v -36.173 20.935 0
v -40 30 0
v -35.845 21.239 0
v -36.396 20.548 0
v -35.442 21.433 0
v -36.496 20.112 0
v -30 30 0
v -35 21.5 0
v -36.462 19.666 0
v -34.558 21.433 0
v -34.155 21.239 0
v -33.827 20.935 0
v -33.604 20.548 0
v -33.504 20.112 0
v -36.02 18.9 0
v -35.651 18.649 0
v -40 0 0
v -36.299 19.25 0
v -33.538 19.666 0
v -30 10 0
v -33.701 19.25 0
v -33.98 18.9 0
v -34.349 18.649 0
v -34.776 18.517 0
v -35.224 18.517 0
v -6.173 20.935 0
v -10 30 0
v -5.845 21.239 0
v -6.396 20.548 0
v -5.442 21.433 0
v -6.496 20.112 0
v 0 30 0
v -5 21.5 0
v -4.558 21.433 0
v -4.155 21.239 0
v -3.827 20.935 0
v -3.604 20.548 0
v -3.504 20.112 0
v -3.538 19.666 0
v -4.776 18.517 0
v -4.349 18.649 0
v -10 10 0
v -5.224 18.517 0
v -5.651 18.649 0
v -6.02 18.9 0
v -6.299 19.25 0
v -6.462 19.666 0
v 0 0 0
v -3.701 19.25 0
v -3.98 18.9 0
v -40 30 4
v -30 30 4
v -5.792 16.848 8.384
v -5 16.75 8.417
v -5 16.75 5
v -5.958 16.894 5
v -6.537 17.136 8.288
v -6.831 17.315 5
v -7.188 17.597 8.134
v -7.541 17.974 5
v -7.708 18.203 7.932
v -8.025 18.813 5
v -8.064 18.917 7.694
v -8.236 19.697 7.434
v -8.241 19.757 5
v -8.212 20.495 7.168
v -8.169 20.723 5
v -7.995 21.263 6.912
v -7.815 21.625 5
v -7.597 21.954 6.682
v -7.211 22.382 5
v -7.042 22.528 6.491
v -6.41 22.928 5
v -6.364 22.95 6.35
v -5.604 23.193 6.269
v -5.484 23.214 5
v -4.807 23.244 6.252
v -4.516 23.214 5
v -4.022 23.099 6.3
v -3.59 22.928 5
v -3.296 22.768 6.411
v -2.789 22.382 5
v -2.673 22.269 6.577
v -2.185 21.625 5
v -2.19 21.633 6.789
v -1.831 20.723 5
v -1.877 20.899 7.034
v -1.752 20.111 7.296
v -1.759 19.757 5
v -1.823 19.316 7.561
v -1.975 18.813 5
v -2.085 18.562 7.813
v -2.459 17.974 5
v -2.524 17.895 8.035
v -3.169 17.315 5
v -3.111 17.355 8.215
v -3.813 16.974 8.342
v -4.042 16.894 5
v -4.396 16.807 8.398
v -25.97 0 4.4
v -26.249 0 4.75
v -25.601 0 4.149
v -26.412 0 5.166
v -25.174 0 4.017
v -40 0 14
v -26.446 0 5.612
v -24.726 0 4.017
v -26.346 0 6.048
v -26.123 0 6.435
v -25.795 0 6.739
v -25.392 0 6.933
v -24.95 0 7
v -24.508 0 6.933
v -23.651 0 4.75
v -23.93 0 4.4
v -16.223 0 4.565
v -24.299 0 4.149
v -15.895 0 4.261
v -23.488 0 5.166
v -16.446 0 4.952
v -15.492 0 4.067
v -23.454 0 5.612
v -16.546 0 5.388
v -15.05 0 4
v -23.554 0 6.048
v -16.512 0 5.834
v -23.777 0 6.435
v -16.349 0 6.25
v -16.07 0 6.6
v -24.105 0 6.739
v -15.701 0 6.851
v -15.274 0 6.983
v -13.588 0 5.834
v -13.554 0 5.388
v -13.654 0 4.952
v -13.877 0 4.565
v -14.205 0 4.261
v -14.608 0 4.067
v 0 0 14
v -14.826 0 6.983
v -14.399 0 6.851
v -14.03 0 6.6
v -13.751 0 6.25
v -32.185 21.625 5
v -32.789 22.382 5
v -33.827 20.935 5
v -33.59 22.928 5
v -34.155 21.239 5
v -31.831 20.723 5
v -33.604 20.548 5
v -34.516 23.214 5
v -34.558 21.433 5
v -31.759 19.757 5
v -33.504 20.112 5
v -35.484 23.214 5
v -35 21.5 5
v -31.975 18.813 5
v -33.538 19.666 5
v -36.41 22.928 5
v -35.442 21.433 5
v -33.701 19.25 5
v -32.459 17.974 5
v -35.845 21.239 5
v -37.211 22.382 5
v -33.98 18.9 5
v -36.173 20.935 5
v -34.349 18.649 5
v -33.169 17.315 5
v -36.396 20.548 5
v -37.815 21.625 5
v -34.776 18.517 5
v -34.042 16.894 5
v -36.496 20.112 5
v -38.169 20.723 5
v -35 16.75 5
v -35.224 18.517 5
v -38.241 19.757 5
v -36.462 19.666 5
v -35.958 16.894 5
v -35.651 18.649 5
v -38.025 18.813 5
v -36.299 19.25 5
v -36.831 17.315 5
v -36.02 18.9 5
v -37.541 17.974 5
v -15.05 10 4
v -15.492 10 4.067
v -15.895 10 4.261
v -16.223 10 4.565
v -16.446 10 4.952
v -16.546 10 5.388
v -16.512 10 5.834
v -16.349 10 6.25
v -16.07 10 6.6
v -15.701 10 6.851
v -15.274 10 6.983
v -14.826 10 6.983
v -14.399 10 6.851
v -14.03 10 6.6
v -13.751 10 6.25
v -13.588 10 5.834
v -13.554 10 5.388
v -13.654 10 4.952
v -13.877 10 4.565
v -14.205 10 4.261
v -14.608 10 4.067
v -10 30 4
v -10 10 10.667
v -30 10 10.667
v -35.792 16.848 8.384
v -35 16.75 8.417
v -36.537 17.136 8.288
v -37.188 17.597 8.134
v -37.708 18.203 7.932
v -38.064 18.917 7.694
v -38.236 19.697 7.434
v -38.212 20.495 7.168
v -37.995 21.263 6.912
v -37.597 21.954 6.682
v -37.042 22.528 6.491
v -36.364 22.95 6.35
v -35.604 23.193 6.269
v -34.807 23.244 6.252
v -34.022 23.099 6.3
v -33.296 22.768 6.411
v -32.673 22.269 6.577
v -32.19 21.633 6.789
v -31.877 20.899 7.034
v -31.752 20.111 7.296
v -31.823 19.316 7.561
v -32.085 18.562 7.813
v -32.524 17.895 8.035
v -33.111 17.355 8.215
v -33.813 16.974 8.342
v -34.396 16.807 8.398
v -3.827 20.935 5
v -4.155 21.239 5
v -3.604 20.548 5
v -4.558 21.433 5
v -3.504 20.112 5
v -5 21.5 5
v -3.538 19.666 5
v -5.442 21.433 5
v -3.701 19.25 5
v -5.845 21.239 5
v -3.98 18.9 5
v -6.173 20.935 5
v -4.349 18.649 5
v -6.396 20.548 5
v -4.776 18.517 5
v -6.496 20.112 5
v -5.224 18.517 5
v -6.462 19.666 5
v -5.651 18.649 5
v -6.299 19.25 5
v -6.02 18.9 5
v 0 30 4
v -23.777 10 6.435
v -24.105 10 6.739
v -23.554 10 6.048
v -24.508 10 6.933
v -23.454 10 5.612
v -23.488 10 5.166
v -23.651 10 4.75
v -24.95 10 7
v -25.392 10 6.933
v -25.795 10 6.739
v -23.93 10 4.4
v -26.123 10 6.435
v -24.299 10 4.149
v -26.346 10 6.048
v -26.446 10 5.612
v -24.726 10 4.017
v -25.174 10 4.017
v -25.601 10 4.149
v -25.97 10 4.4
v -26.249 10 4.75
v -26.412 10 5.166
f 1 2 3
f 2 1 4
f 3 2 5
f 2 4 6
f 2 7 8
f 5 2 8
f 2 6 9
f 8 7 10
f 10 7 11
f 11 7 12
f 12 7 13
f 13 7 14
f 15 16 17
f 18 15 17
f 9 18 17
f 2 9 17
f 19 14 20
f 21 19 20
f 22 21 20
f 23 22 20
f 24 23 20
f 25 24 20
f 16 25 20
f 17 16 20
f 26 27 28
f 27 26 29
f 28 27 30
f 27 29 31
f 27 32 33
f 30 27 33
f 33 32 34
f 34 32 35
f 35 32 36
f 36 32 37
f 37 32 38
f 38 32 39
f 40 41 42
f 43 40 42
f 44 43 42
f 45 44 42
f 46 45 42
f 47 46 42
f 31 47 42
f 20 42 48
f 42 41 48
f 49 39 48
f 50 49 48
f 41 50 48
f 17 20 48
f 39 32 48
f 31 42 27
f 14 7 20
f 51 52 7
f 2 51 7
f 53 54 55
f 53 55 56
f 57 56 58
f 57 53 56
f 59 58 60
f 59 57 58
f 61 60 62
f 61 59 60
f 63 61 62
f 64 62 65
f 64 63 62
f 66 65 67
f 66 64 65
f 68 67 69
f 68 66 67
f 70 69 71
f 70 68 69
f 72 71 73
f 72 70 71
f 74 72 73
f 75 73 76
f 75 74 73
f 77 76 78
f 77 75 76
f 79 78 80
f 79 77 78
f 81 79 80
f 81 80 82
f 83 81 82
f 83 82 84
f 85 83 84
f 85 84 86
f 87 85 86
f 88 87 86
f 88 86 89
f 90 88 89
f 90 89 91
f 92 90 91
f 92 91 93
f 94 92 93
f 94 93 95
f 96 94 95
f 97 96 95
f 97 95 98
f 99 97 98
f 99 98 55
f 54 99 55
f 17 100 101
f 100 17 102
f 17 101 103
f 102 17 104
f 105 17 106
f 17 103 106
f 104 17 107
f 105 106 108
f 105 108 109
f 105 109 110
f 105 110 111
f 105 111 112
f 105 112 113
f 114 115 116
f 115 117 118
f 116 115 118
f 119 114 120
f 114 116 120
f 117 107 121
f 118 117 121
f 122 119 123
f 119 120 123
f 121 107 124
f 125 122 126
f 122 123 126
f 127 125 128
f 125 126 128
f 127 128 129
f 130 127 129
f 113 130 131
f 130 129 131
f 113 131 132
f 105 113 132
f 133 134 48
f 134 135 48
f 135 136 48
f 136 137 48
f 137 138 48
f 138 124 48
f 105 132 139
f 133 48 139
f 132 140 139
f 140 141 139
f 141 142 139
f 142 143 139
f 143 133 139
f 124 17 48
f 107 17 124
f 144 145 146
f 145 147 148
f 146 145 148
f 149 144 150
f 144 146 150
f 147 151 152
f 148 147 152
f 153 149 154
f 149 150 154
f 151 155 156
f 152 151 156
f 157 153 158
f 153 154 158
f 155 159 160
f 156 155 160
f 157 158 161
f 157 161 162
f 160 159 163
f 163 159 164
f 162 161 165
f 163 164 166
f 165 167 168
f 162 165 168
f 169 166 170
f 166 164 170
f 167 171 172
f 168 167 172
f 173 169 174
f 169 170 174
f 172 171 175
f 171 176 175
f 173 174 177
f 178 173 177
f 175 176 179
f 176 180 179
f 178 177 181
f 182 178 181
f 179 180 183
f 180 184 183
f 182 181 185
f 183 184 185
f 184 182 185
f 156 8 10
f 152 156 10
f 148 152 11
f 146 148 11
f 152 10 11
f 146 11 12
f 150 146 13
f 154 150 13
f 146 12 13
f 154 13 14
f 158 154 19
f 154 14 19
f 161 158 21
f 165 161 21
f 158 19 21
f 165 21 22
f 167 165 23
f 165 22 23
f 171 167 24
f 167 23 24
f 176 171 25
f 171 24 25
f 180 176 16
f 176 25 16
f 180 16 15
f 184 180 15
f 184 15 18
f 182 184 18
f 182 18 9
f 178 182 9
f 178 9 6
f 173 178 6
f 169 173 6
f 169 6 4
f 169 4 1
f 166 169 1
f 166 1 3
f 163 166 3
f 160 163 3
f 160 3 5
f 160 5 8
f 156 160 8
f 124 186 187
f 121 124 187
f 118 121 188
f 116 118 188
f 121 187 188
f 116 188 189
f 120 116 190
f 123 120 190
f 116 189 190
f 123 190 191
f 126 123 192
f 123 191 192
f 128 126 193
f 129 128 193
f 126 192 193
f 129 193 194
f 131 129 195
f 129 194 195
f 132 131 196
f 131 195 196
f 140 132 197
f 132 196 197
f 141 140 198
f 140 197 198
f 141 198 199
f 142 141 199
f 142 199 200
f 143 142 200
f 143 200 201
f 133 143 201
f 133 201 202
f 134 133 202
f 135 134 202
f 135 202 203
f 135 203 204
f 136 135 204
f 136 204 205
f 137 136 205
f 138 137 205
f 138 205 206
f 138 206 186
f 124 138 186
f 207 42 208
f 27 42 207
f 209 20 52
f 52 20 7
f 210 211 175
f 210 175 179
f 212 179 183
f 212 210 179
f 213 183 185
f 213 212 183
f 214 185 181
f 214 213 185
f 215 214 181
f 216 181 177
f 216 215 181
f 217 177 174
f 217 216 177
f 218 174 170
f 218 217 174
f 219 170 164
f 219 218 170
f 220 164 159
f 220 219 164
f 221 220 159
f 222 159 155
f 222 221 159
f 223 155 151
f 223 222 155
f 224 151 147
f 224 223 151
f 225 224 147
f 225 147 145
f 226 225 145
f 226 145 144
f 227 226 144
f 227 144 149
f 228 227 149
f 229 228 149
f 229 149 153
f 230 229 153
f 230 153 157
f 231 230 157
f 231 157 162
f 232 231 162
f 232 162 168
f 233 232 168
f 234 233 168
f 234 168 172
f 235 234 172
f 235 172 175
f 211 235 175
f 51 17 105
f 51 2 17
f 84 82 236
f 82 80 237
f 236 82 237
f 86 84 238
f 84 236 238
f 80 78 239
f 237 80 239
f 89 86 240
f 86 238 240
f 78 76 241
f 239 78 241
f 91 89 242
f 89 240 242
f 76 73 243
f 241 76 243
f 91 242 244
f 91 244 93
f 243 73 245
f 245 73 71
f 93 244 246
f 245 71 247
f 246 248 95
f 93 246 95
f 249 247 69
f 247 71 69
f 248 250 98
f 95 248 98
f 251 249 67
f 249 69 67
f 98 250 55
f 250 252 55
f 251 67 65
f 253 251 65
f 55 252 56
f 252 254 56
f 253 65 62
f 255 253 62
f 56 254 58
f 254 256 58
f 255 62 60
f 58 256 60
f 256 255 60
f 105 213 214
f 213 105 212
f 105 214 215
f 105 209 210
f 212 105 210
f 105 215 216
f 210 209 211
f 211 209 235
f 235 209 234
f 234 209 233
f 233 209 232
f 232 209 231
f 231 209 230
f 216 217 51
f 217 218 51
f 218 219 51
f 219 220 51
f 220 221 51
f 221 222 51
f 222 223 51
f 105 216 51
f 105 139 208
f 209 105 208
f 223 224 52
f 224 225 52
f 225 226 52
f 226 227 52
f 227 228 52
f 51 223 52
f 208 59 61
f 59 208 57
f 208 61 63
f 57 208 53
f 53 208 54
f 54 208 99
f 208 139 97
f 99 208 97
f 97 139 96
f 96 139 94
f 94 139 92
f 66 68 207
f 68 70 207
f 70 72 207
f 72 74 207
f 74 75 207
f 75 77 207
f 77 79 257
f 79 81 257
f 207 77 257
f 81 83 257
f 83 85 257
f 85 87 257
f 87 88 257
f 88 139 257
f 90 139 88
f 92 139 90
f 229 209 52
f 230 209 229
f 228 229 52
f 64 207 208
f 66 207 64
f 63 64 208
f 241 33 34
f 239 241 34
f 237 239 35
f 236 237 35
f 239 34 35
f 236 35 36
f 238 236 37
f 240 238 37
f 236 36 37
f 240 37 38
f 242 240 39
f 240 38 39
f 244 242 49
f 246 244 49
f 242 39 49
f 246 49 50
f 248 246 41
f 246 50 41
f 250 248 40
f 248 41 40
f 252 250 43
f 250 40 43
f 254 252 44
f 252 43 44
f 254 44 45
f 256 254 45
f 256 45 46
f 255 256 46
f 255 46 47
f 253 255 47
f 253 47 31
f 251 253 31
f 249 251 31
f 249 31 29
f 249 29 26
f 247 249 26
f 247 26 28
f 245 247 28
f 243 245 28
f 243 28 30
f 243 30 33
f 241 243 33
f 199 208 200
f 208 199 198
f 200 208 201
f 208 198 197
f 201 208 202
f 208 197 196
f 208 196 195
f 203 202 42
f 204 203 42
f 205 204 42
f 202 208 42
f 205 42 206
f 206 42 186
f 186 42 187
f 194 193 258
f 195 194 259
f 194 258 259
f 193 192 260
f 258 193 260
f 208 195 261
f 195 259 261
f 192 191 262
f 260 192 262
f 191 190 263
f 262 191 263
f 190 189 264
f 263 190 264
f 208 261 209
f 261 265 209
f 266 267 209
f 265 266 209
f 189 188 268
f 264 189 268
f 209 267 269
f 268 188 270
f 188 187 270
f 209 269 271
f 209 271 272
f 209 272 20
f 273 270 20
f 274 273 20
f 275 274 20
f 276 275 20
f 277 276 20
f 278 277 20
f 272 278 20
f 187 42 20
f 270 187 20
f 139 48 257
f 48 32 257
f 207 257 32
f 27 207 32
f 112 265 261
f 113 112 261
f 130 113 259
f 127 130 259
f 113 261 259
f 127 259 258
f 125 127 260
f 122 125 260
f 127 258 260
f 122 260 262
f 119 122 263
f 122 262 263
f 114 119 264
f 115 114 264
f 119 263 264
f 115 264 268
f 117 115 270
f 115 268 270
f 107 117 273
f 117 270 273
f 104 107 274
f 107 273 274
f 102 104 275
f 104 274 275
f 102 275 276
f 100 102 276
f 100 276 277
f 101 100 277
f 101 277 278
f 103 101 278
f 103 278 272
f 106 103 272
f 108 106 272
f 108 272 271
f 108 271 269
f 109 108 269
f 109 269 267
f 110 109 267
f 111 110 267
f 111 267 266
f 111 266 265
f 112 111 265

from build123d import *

# Parameters (mm, degrees)
EXTRUDE1_DEPTH = 40
SKETCH2_W      = 20
SKETCH2_H      = 20
EXTRUDE2_DEPTH = 52.923019943
SKETCH3_R      = 1.5
EXTRUDE3_DEPTH = 52.923019943
SKETCH4_R      = 1.5
EXTRUDE4_DEPTH = 47.861498055
SKETCH8_R      = 3.25
EXTRUDE5_DEPTH = 9


with BuildPart() as part:
    # Sketch1 → Extrude1 (new body)
    with BuildSketch(Plane(origin=(0, 0, 0), x_dir=(0, 0, -1), z_dir=(1, 0, 0))):
        Polygon((0, 0), (-14, 0), (-4, 30), (0, 30), align=None)
    extrude(amount=-EXTRUDE1_DEPTH)

    # Sketch2 → Extrude2 (cut, through all)
    with BuildSketch(Plane(origin=(0, 0, 0), x_dir=(-1, 0, 0), z_dir=(0, 0, -1))):
        with Locations((20, 20)):
            Rectangle(SKETCH2_W, SKETCH2_H)
    extrude(amount=-EXTRUDE2_DEPTH, mode=Mode.SUBTRACT)

    # Sketch3 → Extrude3 (cut, through all)
    with BuildSketch(Plane(origin=(0, 0, 0), x_dir=(-1, 0, 0), z_dir=(0, 0, -1))):
        with Locations(Location((5, 20, 0), (0, 0, 90))):
            Circle(SKETCH3_R)
        with Locations(Location((35, 20, 0), (0, 0, 90))):
            Circle(SKETCH3_R)
    extrude(amount=-EXTRUDE3_DEPTH, mode=Mode.SUBTRACT)

    # Sketch4 → Extrude4 (cut, through all)
    with BuildSketch(Plane(origin=(0, 10, 0), x_dir=(1, 0, 0), z_dir=(0, 1, 0))):
        with Locations(Location((-24.95, -5.5, 0), (0, 0, 270))):
            Circle(SKETCH4_R)
        with Locations(Location((-15.05, -5.5, 0), (0, 0, 90))):
            Circle(SKETCH4_R)
    extrude(amount=-EXTRUDE4_DEPTH, mode=Mode.SUBTRACT)

    # Sketch8 → Extrude5 (cut)
    with BuildSketch(Plane(origin=(0, 0, 14), x_dir=(-1, 0, 0), z_dir=(0, 0, -1))):
        with Locations(Location((5, 20, 0), (0, 0, 270))):
            Circle(SKETCH8_R)
        with Locations(Location((35, 20, 0), (0, 0, 270))):
            Circle(SKETCH8_R)
    extrude(amount=EXTRUDE5_DEPTH, mode=Mode.SUBTRACT)


solid = part.part
